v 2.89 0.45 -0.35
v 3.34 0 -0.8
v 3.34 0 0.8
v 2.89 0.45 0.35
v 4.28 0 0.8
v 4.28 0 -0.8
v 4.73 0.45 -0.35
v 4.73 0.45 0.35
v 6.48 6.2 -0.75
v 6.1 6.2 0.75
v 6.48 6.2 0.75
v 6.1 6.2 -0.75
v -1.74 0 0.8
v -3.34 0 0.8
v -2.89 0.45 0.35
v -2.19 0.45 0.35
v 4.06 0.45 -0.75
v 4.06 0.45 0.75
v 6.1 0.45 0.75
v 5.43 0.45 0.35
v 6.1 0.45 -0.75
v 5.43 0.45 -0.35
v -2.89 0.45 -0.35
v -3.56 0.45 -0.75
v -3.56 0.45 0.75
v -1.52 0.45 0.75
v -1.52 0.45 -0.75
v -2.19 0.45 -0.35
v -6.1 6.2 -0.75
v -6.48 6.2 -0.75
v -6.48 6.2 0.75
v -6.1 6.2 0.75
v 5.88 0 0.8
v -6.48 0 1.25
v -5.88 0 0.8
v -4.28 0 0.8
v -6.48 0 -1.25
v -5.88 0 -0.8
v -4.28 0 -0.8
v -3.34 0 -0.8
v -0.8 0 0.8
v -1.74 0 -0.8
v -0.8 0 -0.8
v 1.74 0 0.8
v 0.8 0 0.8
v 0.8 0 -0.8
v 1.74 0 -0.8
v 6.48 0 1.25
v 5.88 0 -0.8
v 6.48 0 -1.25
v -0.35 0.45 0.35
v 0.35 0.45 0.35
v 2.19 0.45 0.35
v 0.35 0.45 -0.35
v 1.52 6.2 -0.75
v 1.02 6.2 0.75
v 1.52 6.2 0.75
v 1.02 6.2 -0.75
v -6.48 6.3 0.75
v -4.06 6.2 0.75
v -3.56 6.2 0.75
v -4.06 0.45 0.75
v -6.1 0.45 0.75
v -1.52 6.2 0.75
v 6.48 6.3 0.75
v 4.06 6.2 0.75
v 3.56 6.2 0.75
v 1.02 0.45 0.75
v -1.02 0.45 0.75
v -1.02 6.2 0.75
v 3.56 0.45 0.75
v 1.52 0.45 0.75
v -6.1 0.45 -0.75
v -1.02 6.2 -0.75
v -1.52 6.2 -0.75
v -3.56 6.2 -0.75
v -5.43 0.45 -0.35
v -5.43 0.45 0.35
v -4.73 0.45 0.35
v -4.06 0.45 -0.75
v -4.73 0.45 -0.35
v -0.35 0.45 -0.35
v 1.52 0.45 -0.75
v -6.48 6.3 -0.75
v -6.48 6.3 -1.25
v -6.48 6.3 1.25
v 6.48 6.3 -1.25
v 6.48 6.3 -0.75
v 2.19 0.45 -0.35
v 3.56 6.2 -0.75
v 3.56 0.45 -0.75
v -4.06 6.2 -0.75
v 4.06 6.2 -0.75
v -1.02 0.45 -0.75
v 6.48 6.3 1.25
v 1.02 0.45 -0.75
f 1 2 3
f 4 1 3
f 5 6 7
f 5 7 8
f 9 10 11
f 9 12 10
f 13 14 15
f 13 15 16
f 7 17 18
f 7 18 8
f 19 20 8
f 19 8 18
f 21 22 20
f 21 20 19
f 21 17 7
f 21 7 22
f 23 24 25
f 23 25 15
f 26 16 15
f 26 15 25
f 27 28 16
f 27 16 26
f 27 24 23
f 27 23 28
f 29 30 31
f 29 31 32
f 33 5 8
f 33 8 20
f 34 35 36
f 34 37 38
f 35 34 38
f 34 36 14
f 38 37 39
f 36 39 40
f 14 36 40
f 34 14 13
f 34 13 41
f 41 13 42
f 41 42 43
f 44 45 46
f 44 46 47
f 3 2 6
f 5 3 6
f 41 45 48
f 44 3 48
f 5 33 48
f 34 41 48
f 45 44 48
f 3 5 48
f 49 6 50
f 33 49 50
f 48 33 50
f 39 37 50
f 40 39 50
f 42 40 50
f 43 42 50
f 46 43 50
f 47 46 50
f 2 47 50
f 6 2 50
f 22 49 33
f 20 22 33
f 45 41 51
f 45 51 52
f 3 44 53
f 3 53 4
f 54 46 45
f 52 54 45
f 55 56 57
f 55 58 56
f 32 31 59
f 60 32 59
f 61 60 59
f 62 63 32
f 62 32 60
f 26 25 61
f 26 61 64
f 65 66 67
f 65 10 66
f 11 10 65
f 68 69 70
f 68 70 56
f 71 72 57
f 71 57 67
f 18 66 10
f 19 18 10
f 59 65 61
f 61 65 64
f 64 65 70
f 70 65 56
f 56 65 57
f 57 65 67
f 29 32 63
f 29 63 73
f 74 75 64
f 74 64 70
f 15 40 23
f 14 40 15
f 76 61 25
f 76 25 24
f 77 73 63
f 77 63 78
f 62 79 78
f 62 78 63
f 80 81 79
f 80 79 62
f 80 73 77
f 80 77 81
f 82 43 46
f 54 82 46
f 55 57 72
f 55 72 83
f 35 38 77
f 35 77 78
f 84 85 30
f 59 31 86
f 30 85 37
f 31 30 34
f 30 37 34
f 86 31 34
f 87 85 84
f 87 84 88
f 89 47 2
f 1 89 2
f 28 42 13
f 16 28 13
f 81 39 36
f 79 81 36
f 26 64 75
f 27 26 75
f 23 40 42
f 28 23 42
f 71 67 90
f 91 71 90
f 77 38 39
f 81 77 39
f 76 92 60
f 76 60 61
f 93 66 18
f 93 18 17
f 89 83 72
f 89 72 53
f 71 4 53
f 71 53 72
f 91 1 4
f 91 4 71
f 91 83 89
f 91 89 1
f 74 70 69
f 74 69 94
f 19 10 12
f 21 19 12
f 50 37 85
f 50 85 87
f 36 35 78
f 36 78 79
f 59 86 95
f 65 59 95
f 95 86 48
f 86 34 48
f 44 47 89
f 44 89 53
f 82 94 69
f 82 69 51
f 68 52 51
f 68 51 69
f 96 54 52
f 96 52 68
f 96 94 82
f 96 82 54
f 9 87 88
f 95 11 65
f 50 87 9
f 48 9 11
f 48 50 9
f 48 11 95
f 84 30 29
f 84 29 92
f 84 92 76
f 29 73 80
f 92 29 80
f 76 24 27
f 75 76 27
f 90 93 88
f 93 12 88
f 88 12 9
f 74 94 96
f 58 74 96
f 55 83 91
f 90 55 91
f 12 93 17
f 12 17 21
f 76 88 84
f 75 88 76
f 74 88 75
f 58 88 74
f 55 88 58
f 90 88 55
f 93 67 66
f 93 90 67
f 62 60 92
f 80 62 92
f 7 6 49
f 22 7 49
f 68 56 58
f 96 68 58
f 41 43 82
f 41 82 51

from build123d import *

# Parameters (mm, degrees)
SKETCH1_W                 = 12.96
SKETCH1_H                 = 2.5
BOSS_EXTRUDE1_DEPTH       = 6.2
SKETCH2_W                 = 2.04
SKETCH2_H                 = 1.5
CUT_EXTRUDE1_DEPTH        = 5.75
SKETCH3_W                 = 1.6
SKETCH3_H                 = 1.6
CUT_EXTRUDE2_DEPTH        = 0.45
CUT_EXTRUDE2_DRAFT        = -45
LPATTERN1_COUNT           = 5
LPATTERN1_PITCH           = 2.54
LPATTERN1_COPY_1_SKETCH_W = 1.6
LPATTERN1_COPY_1_SKETCH_H = 1.6
LPATTERN1_COPY_1_DEPTH    = 0.45
LPATTERN1_COPY_1_DRAFT    = -45
LPATTERN1_COPY_2_SKETCH_W = 1.6
LPATTERN1_COPY_2_SKETCH_H = 1.6
LPATTERN1_COPY_2_DEPTH    = 0.45
LPATTERN1_COPY_2_DRAFT    = -45
LPATTERN1_COPY_3_SKETCH_W = 1.6
LPATTERN1_COPY_3_SKETCH_H = 1.6
LPATTERN1_COPY_3_DEPTH    = 0.45
LPATTERN1_COPY_3_DRAFT    = -45
LPATTERN1_COPY_4_SKETCH_W = 1.6
LPATTERN1_COPY_4_SKETCH_H = 1.6
LPATTERN1_COPY_4_DEPTH    = 0.45
LPATTERN1_COPY_4_DRAFT    = -45
SKETCH4_W                 = 12.96
SKETCH4_H                 = 0.5
BOSS_EXTRUDE2_DEPTH       = 0.1


with BuildPart() as part:
    # Sketch1 → Boss-Extrude1 (new body)
    with BuildSketch(Plane(origin=(0, 0, 0), x_dir=(1, 0, 0), z_dir=(0, 1, 0))):
        Rectangle(SKETCH1_W, SKETCH1_H)
    extrude(amount=BOSS_EXTRUDE1_DEPTH)

    # Sketch2 → Cut-Extrude1 (cut)
    with BuildSketch(Plane(origin=(0, 6.2, 0), x_dir=(1, 0, 0), z_dir=(0, 1, 0))):
        with Locations((-5.08, 0)):
            Rectangle(SKETCH2_W, SKETCH2_H)
    cut_extrude1 = extrude(amount=-CUT_EXTRUDE1_DEPTH, mode=Mode.SUBTRACT)


with BuildPart() as cut_extrude2_tool:
    # Sketch3 → Cut-Extrude2 (with draft: the straight prism first)
    with BuildSketch(Plane.XZ):
        with Locations((-5.08, 0)):
            Rectangle(SKETCH3_W, SKETCH3_H)
    extrude(amount=-CUT_EXTRUDE2_DEPTH)
    # Cut-Extrude2: the draft: its side faces are tilted about the plane it starts from
    cut_extrude2_sides = [cut_extrude2_tool.faces().sort_by_distance(p)[0] for p in [
        (-5.08, 0.225, -0.8),
        (-4.28, 0.225, 0),
        (-5.08, 0.225, 0.8),
        (-5.88, 0.225, 0),
    ]]
    draft(cut_extrude2_sides, Plane.XZ, CUT_EXTRUDE2_DRAFT)


with BuildPart() as part_1:
    add(part.part)

    # Cut-Extrude2: cut by cut_extrude2_tool
    add(cut_extrude2_tool.part, mode=Mode.SUBTRACT)

    # LPattern1: Cut-Extrude1 ×5
    with Locations(*[(i * LPATTERN1_PITCH, 0, 0) for i in range(1, LPATTERN1_COUNT)]):
        add(cut_extrude1, mode=Mode.SUBTRACT)


with BuildPart() as lpattern1_copy_1_tool:
    # LPattern1 copy 1 sketch → LPattern1 copy 1 (with draft: the straight prism first)
    with BuildSketch(Plane(origin=(2.54, 0, 0), x_dir=(1, 0, 0), z_dir=(0, -1, 0))):
        with Locations((-5.08, 0)):
            Rectangle(LPATTERN1_COPY_1_SKETCH_W, LPATTERN1_COPY_1_SKETCH_H)
    extrude(amount=-LPATTERN1_COPY_1_DEPTH)
    # LPattern1 copy 1: the draft: its side faces are tilted about the plane it starts from
    lpattern1_copy_1_sides = [lpattern1_copy_1_tool.faces().sort_by_distance(p)[0] for p in [
        (-2.54, 0.225, -0.8),
        (-1.74, 0.225, 0),
        (-2.54, 0.225, 0.8),
        (-3.34, 0.225, 0),
    ]]
    draft(lpattern1_copy_1_sides, Plane(origin=(2.54, 0, 0), x_dir=(1, 0, 0), z_dir=(0, -1, 0)), LPATTERN1_COPY_1_DRAFT)


with BuildPart() as part_2:
    add(part_1.part)

    # LPattern1 copy 1: cut by lpattern1_copy_1_tool
    add(lpattern1_copy_1_tool.part, mode=Mode.SUBTRACT)


with BuildPart() as lpattern1_copy_2_tool:
    # LPattern1 copy 2 sketch → LPattern1 copy 2 (with draft: the straight prism first)
    with BuildSketch(Plane(origin=(5.08, 0, 0), x_dir=(1, 0, 0), z_dir=(0, -1, 0))):
        with Locations((-5.08, 0)):
            Rectangle(LPATTERN1_COPY_2_SKETCH_W, LPATTERN1_COPY_2_SKETCH_H)
    extrude(amount=-LPATTERN1_COPY_2_DEPTH)
    # LPattern1 copy 2: the draft: its side faces are tilted about the plane it starts from
    lpattern1_copy_2_sides = [lpattern1_copy_2_tool.faces().sort_by_distance(p)[0] for p in [
        (0, 0.225, -0.8),
        (0.8, 0.225, 0),
        (0, 0.225, 0.8),
        (-0.8, 0.225, 0),
    ]]
    draft(lpattern1_copy_2_sides, Plane(origin=(5.08, 0, 0), x_dir=(1, 0, 0), z_dir=(0, -1, 0)), LPATTERN1_COPY_2_DRAFT)


with BuildPart() as part_3:
    add(part_2.part)

    # LPattern1 copy 2: cut by lpattern1_copy_2_tool
    add(lpattern1_copy_2_tool.part, mode=Mode.SUBTRACT)


with BuildPart() as lpattern1_copy_3_tool:
    # LPattern1 copy 3 sketch → LPattern1 copy 3 (with draft: the straight prism first)
    with BuildSketch(Plane(origin=(7.62, 0, 0), x_dir=(1, 0, 0), z_dir=(0, -1, 0))):
        with Locations((-5.08, 0)):
            Rectangle(LPATTERN1_COPY_3_SKETCH_W, LPATTERN1_COPY_3_SKETCH_H)
    extrude(amount=-LPATTERN1_COPY_3_DEPTH)
    # LPattern1 copy 3: the draft: its side faces are tilted about the plane it starts from
    lpattern1_copy_3_sides = [lpattern1_copy_3_tool.faces().sort_by_distance(p)[0] for p in [
        (2.54, 0.225, -0.8),
        (3.34, 0.225, 0),
        (2.54, 0.225, 0.8),
        (1.74, 0.225, 0),
    ]]
    draft(lpattern1_copy_3_sides, Plane(origin=(7.62, 0, 0), x_dir=(1, 0, 0), z_dir=(0, -1, 0)), LPATTERN1_COPY_3_DRAFT)


with BuildPart() as part_4:
    add(part_3.part)

    # LPattern1 copy 3: cut by lpattern1_copy_3_tool
    add(lpattern1_copy_3_tool.part, mode=Mode.SUBTRACT)


with BuildPart() as lpattern1_copy_4_tool:
    # LPattern1 copy 4 sketch → LPattern1 copy 4 (with draft: the straight prism first)
    with BuildSketch(Plane(origin=(10.16, 0, 0), x_dir=(1, 0, 0), z_dir=(0, -1, 0))):
        with Locations((-5.08, 0)):
            Rectangle(LPATTERN1_COPY_4_SKETCH_W, LPATTERN1_COPY_4_SKETCH_H)
    extrude(amount=-LPATTERN1_COPY_4_DEPTH)
    # LPattern1 copy 4: the draft: its side faces are tilted about the plane it starts from
    lpattern1_copy_4_sides = [lpattern1_copy_4_tool.faces().sort_by_distance(p)[0] for p in [
        (5.08, 0.225, -0.8),
        (5.88, 0.225, 0),
        (5.08, 0.225, 0.8),
        (4.28, 0.225, 0),
    ]]
    draft(lpattern1_copy_4_sides, Plane(origin=(10.16, 0, 0), x_dir=(1, 0, 0), z_dir=(0, -1, 0)), LPATTERN1_COPY_4_DRAFT)


with BuildPart() as part_5:
    add(part_4.part)

    # LPattern1 copy 4: cut by lpattern1_copy_4_tool
    add(lpattern1_copy_4_tool.part, mode=Mode.SUBTRACT)

    # Sketch4 → Boss-Extrude2 (add)
    with BuildSketch(Plane(origin=(0, 6.2, 0), x_dir=(1, 0, 0), z_dir=(0, 1, 0))):
        with Locations((0, 1)):
            Rectangle(SKETCH4_W, SKETCH4_H)
    boss_extrude2 = extrude(amount=BOSS_EXTRUDE2_DEPTH)

    # Mirror1: Boss-Extrude2 across plane
    add(boss_extrude2.mirror(Plane.XY))


solid = part_5.part
